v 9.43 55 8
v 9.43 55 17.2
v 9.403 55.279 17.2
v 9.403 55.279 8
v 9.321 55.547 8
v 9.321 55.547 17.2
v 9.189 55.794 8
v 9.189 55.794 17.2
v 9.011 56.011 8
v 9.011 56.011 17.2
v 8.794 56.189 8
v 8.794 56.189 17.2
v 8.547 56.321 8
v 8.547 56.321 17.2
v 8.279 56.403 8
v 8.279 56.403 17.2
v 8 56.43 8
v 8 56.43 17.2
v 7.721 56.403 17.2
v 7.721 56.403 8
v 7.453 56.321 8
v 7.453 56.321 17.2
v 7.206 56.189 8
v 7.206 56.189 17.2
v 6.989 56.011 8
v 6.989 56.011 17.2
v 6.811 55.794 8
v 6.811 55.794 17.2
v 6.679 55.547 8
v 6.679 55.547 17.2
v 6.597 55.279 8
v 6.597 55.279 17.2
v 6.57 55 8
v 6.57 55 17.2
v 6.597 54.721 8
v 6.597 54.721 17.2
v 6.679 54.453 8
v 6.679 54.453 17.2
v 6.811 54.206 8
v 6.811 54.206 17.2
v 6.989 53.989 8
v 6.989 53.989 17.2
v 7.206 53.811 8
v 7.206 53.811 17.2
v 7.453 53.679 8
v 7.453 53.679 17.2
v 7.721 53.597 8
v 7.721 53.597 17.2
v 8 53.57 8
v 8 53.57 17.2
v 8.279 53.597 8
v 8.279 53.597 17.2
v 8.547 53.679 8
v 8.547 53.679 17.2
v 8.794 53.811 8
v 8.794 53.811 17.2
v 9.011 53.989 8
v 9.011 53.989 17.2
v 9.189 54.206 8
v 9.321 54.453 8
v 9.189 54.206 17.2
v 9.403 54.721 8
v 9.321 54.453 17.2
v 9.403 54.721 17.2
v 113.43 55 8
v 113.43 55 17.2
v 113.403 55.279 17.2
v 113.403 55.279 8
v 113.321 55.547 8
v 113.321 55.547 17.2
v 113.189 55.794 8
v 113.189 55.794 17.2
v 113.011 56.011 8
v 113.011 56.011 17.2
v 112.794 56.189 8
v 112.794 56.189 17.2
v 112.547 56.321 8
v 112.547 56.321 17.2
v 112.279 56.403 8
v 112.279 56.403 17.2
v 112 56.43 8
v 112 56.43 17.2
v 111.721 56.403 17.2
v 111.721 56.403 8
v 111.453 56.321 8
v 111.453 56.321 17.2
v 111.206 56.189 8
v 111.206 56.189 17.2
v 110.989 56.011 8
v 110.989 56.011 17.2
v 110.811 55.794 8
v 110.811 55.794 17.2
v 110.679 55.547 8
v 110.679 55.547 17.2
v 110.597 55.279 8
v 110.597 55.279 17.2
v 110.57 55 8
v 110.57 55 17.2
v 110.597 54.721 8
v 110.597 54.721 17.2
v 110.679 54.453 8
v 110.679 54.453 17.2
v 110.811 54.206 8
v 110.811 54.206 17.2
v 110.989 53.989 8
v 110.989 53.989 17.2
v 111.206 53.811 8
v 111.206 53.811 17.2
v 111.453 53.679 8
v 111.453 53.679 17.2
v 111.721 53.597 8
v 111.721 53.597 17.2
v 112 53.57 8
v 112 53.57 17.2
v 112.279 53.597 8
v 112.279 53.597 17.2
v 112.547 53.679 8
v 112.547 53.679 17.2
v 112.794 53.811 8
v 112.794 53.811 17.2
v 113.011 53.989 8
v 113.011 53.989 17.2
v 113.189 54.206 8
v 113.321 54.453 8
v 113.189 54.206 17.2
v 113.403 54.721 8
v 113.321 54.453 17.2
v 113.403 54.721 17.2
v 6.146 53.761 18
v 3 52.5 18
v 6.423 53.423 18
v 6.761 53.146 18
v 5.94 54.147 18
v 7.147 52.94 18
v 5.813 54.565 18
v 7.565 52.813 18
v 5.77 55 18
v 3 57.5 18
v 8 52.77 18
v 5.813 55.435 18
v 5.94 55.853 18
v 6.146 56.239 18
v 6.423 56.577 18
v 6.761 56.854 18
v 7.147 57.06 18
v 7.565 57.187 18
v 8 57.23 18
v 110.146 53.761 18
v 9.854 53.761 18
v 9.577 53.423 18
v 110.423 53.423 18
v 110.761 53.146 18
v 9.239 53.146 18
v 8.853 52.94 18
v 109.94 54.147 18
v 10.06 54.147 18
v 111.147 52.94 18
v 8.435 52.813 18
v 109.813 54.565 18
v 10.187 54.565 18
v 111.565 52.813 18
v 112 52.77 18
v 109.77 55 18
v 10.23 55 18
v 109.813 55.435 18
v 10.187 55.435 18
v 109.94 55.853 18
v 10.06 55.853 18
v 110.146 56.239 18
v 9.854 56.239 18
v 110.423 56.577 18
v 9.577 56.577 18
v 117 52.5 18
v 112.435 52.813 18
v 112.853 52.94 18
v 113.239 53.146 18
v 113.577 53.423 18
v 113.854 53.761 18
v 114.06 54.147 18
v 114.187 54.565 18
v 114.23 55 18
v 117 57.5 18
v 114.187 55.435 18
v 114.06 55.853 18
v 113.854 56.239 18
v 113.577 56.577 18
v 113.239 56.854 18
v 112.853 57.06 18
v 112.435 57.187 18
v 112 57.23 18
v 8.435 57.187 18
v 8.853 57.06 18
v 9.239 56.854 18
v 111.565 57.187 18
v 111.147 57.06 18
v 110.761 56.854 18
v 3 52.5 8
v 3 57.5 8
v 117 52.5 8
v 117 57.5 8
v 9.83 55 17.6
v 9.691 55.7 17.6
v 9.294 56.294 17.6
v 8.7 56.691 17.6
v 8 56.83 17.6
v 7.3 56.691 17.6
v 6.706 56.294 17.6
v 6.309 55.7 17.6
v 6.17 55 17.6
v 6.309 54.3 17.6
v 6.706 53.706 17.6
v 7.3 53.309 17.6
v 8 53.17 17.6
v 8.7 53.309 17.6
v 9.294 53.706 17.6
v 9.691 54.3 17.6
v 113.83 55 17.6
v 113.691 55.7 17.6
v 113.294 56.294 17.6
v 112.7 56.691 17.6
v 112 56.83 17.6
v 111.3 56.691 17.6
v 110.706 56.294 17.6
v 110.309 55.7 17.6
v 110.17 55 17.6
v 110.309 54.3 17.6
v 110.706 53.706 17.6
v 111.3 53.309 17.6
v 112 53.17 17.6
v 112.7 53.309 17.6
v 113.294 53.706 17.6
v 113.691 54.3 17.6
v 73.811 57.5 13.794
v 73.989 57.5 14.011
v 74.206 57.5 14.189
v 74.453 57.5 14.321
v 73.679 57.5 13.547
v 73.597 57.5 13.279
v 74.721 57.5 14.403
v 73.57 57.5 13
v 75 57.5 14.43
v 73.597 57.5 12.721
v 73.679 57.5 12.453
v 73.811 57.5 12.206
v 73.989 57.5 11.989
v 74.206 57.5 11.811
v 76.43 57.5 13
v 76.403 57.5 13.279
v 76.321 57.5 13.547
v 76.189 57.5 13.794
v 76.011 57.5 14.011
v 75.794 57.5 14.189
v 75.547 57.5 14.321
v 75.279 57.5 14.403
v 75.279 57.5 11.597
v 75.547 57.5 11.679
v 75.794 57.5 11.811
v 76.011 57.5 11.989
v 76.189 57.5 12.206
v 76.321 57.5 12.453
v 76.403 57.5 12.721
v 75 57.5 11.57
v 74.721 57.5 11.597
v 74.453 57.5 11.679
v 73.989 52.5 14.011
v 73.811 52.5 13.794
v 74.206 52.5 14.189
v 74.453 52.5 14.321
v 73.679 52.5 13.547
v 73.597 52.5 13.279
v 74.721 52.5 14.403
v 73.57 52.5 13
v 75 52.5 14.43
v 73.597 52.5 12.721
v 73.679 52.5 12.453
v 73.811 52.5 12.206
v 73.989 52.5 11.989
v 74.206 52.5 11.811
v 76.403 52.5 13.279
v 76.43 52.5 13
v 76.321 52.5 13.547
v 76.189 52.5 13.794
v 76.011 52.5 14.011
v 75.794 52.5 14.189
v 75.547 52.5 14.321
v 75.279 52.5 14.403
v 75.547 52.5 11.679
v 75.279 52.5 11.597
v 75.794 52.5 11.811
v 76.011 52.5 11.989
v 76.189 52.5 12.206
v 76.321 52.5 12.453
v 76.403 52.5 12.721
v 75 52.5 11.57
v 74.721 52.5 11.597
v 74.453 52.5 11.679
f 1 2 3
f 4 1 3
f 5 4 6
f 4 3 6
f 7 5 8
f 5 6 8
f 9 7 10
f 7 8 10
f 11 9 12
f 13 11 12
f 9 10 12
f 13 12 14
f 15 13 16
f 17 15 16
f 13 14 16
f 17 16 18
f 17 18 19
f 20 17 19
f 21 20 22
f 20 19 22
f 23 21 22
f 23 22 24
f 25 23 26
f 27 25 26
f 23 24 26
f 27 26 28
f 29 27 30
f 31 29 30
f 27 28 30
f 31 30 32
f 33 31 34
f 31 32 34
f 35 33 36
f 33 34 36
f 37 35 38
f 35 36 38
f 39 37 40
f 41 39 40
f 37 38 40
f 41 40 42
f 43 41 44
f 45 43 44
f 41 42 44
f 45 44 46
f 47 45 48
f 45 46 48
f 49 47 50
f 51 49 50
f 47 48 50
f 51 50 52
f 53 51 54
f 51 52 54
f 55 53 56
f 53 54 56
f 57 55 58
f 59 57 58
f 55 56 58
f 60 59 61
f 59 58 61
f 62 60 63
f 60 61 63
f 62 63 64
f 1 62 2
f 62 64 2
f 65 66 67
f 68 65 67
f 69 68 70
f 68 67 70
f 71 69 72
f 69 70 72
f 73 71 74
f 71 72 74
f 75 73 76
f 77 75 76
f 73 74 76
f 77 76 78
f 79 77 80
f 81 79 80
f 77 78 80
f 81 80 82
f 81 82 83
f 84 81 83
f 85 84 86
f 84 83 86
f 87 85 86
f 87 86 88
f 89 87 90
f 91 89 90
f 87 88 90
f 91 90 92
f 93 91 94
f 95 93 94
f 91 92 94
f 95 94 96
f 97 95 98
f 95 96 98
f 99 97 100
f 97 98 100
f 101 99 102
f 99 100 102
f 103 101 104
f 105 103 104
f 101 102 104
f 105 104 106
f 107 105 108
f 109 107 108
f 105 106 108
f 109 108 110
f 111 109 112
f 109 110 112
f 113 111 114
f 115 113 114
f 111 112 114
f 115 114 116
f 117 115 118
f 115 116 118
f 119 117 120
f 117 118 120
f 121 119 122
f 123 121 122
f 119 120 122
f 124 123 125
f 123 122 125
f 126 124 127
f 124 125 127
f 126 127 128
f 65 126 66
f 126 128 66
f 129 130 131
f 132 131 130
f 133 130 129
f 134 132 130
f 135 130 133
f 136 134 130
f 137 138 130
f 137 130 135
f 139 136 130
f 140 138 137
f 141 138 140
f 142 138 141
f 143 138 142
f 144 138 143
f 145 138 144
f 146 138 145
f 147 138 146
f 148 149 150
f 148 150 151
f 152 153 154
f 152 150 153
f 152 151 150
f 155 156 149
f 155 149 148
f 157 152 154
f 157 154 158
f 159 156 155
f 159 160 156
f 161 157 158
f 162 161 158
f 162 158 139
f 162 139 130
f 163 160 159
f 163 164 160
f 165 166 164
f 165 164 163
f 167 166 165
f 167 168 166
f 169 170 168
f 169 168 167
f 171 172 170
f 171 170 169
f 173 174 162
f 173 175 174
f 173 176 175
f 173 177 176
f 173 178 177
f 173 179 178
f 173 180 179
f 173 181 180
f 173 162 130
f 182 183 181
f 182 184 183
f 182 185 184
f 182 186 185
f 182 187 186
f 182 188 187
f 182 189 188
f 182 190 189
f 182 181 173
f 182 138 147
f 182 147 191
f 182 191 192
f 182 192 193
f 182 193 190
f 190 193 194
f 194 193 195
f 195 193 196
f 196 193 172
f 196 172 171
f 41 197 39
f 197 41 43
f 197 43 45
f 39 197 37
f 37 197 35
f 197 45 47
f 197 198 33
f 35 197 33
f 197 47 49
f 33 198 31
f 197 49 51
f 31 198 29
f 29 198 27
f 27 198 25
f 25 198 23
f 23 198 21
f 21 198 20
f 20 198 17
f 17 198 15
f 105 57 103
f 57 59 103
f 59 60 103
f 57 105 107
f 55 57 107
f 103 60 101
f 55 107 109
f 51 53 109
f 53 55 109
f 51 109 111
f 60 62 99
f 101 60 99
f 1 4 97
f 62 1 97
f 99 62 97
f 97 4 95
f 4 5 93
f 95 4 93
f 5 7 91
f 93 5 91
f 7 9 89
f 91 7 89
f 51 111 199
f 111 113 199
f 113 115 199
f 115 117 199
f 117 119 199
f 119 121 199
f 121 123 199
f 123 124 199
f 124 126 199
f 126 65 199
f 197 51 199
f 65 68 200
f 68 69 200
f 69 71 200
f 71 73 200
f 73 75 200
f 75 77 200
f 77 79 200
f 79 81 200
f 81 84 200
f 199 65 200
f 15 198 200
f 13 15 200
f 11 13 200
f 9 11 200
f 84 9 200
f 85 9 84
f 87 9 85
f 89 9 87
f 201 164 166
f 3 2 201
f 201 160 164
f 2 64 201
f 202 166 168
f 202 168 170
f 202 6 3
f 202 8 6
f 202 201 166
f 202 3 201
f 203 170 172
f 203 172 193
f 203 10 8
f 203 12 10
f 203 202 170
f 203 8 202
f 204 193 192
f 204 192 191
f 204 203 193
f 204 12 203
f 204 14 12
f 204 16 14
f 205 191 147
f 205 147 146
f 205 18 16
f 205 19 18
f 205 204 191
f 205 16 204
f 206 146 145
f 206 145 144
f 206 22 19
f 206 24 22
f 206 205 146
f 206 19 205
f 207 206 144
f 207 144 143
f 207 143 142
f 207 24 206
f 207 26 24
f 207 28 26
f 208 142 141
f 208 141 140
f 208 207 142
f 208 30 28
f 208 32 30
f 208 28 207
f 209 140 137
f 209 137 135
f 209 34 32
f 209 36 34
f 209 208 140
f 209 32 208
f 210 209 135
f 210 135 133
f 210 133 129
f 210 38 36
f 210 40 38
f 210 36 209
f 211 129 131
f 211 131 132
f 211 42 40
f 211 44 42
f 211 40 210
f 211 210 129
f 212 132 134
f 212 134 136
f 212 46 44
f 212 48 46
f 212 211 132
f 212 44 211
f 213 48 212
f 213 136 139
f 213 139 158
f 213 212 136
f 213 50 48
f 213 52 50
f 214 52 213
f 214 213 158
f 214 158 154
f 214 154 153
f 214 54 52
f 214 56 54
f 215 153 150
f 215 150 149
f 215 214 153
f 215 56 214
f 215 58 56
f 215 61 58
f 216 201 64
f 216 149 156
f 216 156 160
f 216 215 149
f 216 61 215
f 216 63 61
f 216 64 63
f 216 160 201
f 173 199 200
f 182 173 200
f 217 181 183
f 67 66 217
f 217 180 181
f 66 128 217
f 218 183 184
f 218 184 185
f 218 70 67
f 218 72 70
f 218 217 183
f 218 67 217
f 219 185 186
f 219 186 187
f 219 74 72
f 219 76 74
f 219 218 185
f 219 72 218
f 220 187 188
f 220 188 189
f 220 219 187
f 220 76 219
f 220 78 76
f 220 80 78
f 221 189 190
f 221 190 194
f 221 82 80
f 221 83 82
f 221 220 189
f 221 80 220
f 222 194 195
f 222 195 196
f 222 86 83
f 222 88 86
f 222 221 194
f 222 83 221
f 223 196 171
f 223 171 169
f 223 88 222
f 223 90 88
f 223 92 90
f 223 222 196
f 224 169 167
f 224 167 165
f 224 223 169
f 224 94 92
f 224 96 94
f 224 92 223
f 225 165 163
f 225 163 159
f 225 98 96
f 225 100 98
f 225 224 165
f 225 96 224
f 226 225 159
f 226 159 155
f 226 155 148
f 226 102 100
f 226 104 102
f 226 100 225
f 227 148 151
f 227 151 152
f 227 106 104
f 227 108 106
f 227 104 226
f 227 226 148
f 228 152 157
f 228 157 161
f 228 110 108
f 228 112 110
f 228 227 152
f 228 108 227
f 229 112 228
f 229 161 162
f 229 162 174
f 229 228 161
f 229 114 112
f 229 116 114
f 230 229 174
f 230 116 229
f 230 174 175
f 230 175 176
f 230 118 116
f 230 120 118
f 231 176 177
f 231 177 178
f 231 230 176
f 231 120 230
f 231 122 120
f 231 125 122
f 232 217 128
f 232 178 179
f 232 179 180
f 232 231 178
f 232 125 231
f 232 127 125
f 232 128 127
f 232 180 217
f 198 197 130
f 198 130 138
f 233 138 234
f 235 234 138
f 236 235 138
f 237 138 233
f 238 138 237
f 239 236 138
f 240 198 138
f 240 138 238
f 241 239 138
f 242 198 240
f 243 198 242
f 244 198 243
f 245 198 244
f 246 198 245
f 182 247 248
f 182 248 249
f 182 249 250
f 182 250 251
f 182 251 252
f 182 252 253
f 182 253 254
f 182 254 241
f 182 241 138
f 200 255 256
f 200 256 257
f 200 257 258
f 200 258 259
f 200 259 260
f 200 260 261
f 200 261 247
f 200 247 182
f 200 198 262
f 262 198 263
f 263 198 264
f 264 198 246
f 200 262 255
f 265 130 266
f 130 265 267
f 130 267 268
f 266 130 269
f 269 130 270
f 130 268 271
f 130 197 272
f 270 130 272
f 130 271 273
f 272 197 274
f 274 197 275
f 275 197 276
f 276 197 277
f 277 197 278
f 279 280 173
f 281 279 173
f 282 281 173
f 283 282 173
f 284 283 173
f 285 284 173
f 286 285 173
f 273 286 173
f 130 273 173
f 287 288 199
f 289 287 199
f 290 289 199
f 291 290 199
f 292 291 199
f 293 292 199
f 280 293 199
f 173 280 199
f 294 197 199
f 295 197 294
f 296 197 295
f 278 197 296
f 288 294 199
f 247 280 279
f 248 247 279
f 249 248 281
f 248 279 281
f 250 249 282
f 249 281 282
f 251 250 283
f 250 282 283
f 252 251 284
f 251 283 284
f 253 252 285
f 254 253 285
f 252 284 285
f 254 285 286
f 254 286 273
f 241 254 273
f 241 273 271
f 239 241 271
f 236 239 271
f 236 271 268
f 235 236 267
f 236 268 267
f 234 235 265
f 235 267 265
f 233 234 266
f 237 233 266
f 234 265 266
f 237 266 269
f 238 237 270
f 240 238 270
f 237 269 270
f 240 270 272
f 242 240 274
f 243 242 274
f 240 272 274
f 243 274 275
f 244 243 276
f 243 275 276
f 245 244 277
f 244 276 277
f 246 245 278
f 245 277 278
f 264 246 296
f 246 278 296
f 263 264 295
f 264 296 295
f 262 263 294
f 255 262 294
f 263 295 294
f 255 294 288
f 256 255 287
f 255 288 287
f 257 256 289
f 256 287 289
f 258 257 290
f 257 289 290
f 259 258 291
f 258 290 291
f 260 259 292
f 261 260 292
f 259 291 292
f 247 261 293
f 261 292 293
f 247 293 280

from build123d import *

# Parameters (mm, degrees)
SKETCH006_W     = 114
SKETCH006_H     = 5
PAD002_DEPTH    = 10
SKETCH007_R     = 1.43
POCKET004_DEPTH = 10
CHAMFER001_SIZE = 0.8
SKETCH010_R     = 1.43
POCKET007_DEPTH = 5


with BuildPart() as part:
    # Sketch006 → Pad002 (new body)
    with BuildSketch(Plane.XY):
        with Locations((60, 45)):
            Rectangle(SKETCH006_W, SKETCH006_H)
    extrude(amount=PAD002_DEPTH)

    # Sketch007 (on Face6 of Pad002) → Pocket004 (cut)
    with BuildSketch(Plane.XY.offset(10)):
        with Locations((8, 45)):
            Circle(SKETCH007_R)
        with Locations((112, 45)):
            Circle(SKETCH007_R)
    extrude(amount=-POCKET004_DEPTH, mode=Mode.SUBTRACT)

    # Chamfer001
    chamfer001_edges = [part.edges().sort_by_distance(p)[0] for p in [
        (110.57, 45, 10),
        (6.57, 45, 10),
    ]]
    chamfer(chamfer001_edges, length=CHAMFER001_SIZE)

    # Sketch010 (on Face6 of Chamfer001) → Pocket007 (cut)
    with BuildSketch(Plane.XZ.offset(-42.5)):
        with Locations((75, 5)):
            Circle(SKETCH010_R)
    extrude(amount=-POCKET007_DEPTH, mode=Mode.SUBTRACT)


with BuildPart() as part_1:
    # Body002 placement: moved
    add(part.part.moved(Location((0, 10, 8))))


solid = part_1.part
